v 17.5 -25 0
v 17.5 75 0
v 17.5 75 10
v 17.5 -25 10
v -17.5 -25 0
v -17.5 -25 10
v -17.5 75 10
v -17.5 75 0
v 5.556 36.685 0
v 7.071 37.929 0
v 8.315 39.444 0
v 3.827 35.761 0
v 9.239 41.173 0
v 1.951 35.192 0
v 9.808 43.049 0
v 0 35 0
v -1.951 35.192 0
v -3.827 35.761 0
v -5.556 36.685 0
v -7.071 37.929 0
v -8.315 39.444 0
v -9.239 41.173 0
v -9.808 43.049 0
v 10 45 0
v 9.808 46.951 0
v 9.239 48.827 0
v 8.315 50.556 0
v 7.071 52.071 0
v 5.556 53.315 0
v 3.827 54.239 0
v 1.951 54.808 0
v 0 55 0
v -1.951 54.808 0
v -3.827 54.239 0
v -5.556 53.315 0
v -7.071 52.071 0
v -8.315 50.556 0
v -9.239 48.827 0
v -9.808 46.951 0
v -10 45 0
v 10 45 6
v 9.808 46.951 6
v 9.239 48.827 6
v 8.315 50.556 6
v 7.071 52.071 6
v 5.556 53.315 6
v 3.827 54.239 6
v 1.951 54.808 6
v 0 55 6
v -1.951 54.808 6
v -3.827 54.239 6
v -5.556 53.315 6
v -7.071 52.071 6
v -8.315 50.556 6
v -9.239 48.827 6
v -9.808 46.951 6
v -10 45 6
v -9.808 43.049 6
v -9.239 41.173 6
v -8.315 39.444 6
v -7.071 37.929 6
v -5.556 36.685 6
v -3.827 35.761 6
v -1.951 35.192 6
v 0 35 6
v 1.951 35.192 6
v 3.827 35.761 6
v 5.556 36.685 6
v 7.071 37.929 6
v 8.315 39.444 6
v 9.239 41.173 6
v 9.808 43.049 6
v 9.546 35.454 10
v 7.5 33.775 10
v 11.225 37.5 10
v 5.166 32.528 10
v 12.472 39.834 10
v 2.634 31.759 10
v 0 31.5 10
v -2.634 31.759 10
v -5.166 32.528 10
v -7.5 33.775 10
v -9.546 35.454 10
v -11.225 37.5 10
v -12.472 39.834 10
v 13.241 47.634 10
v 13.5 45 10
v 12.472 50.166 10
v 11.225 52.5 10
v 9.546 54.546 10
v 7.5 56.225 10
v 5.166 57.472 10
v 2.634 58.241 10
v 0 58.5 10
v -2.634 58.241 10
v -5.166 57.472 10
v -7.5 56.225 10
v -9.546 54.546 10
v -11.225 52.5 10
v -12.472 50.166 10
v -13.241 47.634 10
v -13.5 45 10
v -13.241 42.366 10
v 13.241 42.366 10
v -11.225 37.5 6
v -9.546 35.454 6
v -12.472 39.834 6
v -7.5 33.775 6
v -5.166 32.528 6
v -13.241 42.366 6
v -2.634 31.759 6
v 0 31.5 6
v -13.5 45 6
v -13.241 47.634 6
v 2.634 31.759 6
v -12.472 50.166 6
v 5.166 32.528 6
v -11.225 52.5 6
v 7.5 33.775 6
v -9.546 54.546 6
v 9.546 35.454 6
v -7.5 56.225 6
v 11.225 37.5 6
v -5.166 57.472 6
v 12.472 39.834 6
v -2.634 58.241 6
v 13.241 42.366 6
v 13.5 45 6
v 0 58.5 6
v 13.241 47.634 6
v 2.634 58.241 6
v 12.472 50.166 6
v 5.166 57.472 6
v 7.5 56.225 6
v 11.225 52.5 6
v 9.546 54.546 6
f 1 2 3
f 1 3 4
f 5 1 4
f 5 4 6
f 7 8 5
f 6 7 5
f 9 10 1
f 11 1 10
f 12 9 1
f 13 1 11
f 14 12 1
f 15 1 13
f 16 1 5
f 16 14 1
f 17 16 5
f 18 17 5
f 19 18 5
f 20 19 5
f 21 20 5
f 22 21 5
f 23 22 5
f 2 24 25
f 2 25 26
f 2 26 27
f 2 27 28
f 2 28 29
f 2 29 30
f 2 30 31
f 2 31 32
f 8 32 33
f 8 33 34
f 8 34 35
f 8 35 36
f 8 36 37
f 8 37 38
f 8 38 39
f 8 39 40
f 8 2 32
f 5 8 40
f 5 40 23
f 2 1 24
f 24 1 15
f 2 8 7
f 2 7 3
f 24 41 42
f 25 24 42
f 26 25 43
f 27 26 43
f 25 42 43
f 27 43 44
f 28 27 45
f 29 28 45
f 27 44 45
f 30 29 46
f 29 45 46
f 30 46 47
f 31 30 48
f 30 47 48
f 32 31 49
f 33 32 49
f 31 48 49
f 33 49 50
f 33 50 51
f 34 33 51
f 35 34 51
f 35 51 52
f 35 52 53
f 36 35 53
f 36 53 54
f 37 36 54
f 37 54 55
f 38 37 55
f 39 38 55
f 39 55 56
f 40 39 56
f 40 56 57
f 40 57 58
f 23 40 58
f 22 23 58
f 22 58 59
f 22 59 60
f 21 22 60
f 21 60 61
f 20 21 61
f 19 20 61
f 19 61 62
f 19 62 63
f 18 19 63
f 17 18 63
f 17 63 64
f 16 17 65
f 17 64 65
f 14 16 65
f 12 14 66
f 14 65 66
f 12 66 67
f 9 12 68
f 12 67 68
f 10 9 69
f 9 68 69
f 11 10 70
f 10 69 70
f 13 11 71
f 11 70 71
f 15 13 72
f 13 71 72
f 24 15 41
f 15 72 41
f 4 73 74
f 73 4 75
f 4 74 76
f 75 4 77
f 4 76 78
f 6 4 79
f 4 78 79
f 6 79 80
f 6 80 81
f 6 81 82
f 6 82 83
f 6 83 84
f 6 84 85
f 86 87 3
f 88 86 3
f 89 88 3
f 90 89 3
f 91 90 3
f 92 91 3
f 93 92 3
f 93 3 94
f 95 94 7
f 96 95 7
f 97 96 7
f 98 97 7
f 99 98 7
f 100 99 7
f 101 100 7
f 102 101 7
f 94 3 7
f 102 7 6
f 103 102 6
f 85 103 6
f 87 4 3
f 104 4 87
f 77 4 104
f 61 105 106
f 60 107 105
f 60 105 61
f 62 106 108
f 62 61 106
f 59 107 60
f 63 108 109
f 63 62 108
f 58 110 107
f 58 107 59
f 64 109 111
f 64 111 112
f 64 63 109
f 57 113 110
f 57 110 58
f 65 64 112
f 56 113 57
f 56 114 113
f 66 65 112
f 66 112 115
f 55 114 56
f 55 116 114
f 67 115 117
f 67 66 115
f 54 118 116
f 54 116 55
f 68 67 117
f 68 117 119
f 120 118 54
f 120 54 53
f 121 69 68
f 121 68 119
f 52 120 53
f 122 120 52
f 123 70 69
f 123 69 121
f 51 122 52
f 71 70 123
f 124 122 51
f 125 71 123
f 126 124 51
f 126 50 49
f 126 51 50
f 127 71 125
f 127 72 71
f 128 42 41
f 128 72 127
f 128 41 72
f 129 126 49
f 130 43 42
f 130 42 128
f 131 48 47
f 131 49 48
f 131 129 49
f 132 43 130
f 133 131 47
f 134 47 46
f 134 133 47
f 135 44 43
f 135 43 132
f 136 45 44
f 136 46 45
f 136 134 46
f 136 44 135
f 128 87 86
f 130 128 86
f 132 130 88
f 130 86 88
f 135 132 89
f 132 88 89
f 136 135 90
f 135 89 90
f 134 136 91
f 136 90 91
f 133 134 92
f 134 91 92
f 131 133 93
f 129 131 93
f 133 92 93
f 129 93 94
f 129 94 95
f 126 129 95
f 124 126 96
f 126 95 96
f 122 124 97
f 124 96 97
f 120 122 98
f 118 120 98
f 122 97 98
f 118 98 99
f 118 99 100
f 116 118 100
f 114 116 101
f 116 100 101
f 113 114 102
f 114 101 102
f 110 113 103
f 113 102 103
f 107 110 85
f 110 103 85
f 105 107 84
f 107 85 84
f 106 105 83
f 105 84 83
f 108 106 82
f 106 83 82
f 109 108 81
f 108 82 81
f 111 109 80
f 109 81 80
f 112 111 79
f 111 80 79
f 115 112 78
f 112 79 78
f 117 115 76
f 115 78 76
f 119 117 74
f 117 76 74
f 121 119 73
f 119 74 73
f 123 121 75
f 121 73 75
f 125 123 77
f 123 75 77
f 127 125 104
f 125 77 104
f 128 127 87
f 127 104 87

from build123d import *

# Parameters (mm, degrees)
BOSS_EXTRUDE1_DEPTH = 10
SKETCH4_R           = 13.5
CUT_EXTRUDE1_DEPTH  = 4
SKETCH5_R           = 10
CUT_EXTRUDE2_DEPTH  = 78.24797732


with BuildPart() as part:
    # Sketch1 → Boss-Extrude1 (new body)
    with BuildSketch(Plane.XY):
        Polygon((-17.5, 25), (-17.5, 75), (17.5, 75), (17.5, -25), (-17.5, -25), align=None)
    extrude(amount=BOSS_EXTRUDE1_DEPTH)

    # Sketch4 → Cut-Extrude1 (cut)
    with BuildSketch(Plane.XY.offset(10)):
        with Locations((0, 45)):
            Circle(SKETCH4_R)
    extrude(amount=-CUT_EXTRUDE1_DEPTH, mode=Mode.SUBTRACT)

    # Sketch5 → Cut-Extrude2 (cut, through all)
    with BuildSketch(Plane.XY.offset(6)):
        with Locations((0, 45)):
            Circle(SKETCH5_R)
    extrude(amount=-CUT_EXTRUDE2_DEPTH, mode=Mode.SUBTRACT)


solid = part.part
